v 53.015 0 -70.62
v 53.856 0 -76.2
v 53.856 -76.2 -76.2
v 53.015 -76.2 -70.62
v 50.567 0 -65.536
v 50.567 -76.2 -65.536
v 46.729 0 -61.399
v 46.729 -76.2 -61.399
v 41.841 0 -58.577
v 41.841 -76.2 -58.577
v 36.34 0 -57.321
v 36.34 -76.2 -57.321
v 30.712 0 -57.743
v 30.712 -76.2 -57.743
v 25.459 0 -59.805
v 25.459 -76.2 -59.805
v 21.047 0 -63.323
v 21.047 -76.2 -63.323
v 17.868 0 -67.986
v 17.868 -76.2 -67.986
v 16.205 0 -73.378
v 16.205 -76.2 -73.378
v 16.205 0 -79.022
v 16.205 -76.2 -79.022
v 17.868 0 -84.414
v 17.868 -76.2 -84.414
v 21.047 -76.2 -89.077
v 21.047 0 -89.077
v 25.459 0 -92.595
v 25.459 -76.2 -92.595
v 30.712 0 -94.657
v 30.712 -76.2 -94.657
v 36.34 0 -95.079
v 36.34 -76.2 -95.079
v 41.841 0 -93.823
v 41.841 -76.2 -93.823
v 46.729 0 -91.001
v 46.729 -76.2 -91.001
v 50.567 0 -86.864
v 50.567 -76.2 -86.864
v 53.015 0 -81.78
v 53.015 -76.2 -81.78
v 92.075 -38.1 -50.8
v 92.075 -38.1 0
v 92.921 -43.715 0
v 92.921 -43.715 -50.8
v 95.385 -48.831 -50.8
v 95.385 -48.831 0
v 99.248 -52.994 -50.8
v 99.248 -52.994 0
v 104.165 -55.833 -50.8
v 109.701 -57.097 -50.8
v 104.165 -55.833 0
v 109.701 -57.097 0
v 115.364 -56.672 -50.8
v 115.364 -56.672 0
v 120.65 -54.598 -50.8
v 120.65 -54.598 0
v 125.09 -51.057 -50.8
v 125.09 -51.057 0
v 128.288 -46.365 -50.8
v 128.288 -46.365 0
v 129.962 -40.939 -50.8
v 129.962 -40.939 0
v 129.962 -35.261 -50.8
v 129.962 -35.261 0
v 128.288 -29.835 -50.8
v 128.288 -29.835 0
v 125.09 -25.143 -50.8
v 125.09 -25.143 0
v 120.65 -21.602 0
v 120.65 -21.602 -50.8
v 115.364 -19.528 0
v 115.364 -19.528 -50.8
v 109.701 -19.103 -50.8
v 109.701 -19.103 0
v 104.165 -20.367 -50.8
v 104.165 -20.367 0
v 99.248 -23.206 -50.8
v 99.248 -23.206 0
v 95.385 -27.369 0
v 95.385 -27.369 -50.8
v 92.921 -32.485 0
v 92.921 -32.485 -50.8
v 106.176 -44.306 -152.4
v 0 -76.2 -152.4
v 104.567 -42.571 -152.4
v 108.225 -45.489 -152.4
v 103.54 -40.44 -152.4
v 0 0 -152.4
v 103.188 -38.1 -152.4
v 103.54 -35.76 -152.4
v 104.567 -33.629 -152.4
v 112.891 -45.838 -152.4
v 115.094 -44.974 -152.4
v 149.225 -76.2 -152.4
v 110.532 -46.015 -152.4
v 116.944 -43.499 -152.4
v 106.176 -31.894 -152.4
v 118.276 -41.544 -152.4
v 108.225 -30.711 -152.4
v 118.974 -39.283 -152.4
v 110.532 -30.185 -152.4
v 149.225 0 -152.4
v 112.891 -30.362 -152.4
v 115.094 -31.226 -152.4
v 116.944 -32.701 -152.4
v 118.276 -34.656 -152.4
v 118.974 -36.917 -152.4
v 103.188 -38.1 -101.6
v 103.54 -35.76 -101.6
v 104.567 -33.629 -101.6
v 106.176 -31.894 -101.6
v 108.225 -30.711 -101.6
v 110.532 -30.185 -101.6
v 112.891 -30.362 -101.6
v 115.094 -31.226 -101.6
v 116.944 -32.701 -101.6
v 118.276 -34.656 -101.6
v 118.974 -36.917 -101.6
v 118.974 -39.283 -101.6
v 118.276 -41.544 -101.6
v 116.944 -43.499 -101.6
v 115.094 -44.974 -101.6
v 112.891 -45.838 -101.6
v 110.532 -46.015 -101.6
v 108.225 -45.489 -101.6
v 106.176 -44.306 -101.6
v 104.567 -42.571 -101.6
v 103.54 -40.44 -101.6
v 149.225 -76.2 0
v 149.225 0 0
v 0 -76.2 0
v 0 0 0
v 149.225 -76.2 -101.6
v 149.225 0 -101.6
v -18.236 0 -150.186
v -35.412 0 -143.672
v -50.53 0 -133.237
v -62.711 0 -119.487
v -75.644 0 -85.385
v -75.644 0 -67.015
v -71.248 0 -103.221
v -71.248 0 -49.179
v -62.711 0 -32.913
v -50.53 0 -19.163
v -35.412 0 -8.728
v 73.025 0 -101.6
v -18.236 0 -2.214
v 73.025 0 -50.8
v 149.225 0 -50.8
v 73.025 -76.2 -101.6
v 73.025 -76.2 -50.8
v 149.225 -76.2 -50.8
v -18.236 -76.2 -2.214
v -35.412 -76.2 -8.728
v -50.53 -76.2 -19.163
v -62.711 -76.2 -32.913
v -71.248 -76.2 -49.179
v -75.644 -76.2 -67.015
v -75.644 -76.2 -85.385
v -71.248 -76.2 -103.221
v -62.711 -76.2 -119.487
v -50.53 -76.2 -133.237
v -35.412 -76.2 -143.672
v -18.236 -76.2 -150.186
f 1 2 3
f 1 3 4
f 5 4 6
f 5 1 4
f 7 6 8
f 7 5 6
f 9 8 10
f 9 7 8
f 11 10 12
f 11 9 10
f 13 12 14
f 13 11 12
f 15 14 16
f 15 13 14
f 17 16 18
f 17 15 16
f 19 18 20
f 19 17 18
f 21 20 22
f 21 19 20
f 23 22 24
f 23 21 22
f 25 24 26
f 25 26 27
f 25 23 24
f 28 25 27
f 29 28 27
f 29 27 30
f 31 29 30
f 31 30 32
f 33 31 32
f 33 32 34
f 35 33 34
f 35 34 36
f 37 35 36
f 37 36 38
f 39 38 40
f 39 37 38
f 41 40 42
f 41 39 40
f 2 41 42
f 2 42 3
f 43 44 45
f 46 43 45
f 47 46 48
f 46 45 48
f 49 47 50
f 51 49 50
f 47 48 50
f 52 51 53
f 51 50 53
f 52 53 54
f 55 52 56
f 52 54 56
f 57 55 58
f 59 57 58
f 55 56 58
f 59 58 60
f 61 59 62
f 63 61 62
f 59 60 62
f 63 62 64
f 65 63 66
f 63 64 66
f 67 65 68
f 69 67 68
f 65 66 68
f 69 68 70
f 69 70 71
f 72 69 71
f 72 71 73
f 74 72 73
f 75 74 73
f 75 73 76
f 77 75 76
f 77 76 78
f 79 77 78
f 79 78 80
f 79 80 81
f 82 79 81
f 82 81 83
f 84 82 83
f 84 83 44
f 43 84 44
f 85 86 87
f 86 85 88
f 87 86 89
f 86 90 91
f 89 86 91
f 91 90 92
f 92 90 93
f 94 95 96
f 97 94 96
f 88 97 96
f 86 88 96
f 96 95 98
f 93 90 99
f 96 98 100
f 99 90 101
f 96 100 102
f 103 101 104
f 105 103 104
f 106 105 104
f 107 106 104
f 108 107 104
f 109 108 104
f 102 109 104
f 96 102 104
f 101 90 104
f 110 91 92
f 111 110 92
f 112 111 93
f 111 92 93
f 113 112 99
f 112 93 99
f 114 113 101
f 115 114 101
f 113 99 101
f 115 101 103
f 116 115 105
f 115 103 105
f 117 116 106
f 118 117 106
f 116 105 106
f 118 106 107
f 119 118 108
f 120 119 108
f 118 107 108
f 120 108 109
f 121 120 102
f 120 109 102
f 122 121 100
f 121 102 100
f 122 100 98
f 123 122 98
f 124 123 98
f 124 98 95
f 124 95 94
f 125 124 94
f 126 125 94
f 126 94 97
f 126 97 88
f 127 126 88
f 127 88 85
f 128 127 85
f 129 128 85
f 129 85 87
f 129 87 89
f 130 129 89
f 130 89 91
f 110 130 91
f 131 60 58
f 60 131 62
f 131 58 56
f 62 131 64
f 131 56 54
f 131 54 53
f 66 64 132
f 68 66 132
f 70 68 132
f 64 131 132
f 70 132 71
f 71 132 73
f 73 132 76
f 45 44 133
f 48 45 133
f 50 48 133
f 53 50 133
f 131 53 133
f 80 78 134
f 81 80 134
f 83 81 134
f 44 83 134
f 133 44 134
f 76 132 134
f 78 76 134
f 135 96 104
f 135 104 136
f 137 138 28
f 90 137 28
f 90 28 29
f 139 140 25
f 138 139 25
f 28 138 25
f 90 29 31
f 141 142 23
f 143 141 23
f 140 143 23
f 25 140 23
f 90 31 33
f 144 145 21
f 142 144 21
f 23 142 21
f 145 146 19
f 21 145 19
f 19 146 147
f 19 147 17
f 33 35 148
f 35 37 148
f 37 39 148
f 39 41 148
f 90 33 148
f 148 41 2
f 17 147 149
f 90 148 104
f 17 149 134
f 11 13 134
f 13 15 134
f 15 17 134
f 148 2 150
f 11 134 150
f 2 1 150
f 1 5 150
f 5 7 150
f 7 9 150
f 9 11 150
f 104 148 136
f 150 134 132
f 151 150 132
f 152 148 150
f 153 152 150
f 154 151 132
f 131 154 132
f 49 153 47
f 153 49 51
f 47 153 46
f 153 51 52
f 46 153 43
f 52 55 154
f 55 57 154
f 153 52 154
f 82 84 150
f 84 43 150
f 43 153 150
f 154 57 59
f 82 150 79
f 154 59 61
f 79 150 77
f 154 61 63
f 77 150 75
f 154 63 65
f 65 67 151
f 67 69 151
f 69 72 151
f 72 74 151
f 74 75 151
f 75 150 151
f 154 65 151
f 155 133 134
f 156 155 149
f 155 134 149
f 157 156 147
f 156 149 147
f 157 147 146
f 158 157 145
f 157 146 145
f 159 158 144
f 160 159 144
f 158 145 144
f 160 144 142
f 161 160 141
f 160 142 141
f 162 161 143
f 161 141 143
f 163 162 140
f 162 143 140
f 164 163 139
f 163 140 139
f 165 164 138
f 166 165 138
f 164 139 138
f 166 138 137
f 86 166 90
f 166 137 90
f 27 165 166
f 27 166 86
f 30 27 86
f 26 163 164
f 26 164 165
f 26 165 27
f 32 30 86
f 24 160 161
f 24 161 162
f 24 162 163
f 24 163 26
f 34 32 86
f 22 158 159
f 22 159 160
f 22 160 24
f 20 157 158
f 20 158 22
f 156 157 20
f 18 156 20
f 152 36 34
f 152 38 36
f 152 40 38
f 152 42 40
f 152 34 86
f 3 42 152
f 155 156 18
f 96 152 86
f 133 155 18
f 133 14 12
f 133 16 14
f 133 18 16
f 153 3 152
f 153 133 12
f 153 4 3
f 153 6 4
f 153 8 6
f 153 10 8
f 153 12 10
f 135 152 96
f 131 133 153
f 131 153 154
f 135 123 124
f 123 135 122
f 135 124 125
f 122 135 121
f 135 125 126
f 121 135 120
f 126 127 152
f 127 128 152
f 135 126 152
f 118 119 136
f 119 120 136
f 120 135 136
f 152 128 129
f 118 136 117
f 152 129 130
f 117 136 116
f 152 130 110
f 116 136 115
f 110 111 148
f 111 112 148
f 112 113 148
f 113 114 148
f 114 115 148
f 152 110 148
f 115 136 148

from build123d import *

# Parameters (mm, degrees)
F0_R     = 18.931499
F1_DEPTH = 76.2
F4_D     = 38.1
F4_DEPTH = 50.8
F5_D     = 15.875
F5_DEPTH = 50.8


with BuildPart() as f1:
    # F0 (on Front) → F1 (new body)
    with BuildSketch(Plane.XZ):
        with BuildLine():
            Line((0, -152.4), (0, 0))
            ThreePointArc((0, 0), (-76.2, -76.2), (0, -152.4))
        make_face()
        Polygon((149.225, 0), (0, 0), (0, -152.4), (149.225, -152.4), (149.225, -101.6), (73.025, -101.6), (73.025, -50.8), (149.225, -50.8), align=None)
        with Locations((34.925, -76.2)):
            Circle(F0_R, mode=Mode.SUBTRACT)
    extrude(amount=F1_DEPTH)

    # F4
    with Locations(Plane(origin=(0, 0, -50.8), x_dir=(1, 0, 0), z_dir=(0, 0, -1))):
        with Locations((111.125, 38.1)):
            Hole(F4_D / 2, depth=F4_DEPTH)

    # F5
    with Locations(Plane.XY.offset(-101.6)):
        with Locations((111.125, -38.1)):
            Hole(F5_D / 2, depth=F5_DEPTH)


solid = f1.part
